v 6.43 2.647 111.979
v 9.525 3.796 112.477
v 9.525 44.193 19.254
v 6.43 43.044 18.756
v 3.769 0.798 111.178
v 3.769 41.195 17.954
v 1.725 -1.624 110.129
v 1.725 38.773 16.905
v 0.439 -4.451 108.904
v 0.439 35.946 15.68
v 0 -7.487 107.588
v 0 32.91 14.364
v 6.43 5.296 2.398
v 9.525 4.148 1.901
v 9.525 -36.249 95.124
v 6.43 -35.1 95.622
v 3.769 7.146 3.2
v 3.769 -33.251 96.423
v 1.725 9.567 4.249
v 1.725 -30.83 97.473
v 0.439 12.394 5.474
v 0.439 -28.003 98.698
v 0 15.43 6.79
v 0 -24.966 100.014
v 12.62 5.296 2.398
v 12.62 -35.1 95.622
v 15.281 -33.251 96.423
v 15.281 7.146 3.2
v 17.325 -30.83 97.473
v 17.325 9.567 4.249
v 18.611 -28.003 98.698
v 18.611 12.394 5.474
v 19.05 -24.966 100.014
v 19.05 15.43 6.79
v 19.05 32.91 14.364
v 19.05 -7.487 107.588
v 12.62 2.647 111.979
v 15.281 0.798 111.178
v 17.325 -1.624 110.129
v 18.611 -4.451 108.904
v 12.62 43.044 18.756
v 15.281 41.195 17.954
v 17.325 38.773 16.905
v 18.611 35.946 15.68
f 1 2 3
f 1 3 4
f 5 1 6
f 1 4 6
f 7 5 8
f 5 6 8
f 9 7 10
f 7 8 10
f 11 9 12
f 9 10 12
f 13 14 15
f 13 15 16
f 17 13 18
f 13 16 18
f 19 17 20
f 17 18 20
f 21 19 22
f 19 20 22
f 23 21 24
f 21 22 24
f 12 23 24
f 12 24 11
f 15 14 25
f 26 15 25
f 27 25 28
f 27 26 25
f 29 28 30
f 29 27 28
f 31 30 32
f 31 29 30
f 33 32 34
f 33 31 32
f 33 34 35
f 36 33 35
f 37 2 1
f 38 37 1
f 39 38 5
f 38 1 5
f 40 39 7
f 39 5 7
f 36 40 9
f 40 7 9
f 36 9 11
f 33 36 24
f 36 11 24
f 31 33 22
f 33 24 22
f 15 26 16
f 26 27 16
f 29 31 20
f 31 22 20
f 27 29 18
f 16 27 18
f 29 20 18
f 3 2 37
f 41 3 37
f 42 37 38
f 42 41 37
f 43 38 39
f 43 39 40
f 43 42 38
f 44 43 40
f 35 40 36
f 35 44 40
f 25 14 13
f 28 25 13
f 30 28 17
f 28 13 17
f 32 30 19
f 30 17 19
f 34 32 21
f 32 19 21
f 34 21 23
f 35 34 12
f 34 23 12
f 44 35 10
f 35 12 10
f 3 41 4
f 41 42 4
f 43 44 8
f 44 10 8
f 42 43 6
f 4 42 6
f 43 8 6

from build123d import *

# Parameters (mm, degrees)
F1_DEPTH    = 19.05
F2_T1_DEPTH = 165.1
F2_T3_DEPTH = 165.1


# Not quite as in the source:
# - a fillet or chamfer that OpenCascade refuses, or shapes differently, is made with other operations: its cross-section is extruded or revolved along the edge and cut away or added
# - a feature names something its author has since deleted; it is built from what else it names


with BuildPart() as f1:
    # F0 (on Right) → F1 (new body)
    with BuildSketch(Plane.YZ):
        Polygon((-36.6194384832, 94.9639305791), (3.7774763688, 1.7402786959), (44.5628240677, 19.4139289437), (4.1659092157, 112.6375808269), align=None)
    extrude(amount=F1_DEPTH)

    # F2: fillet of radius 12.7 on 4 edges, made by hand

    # F2_s2 → F2_t1 (cut)
    with BuildSketch(Plane(origin=(0, 12.5863228888, -29.0453612057), x_dir=(1, 0, 0), z_dir=(0, -0.3976074296, 0.9175556288))):
        with BuildLine():
            ThreePointArc((12.7, 48.6079924439), (3.7197438789, 44.888248565), (0, 35.9079924439))
            Line((0, 35.9079924439), (0, 48.6079924439))
            Line((0, 48.6079924439), (12.7, 48.6079924439))
        make_face()
        with BuildLine():
            ThreePointArc((6.35, 48.6079924439), (15.3302561211, 44.888248565), (19.05, 35.9079924439))
            Line((19.05, 35.9079924439), (19.05, 48.6079924439))
            Line((19.05, 48.6079924439), (6.35, 48.6079924439))
        make_face()
    extrude(amount=F2_T1_DEPTH, mode=Mode.SUBTRACT)

    # F2_s4 → F2_t3 (cut)
    with BuildSketch(Plane(origin=(0, -53.0586637457, 122.4430731045), x_dir=(1, 0, 0), z_dir=(0, 0.3976074296, -0.9175556288))):
        with BuildLine():
            ThreePointArc((12.7, -4.1579924439), (3.7197438789, -7.8777363228), (0, -16.8579924439))
            Line((0, -16.8579924439), (0, -4.1579924439))
            Line((0, -4.1579924439), (12.7, -4.1579924439))
        make_face()
        with BuildLine():
            ThreePointArc((6.35, -4.1579924439), (15.3302561211, -7.8777363228), (19.05, -16.8579924439))
            Line((19.05, -16.8579924439), (19.05, -4.1579924439))
            Line((19.05, -4.1579924439), (6.35, -4.1579924439))
        make_face()
    extrude(amount=F2_T3_DEPTH, mode=Mode.SUBTRACT)


solid = f1.part
